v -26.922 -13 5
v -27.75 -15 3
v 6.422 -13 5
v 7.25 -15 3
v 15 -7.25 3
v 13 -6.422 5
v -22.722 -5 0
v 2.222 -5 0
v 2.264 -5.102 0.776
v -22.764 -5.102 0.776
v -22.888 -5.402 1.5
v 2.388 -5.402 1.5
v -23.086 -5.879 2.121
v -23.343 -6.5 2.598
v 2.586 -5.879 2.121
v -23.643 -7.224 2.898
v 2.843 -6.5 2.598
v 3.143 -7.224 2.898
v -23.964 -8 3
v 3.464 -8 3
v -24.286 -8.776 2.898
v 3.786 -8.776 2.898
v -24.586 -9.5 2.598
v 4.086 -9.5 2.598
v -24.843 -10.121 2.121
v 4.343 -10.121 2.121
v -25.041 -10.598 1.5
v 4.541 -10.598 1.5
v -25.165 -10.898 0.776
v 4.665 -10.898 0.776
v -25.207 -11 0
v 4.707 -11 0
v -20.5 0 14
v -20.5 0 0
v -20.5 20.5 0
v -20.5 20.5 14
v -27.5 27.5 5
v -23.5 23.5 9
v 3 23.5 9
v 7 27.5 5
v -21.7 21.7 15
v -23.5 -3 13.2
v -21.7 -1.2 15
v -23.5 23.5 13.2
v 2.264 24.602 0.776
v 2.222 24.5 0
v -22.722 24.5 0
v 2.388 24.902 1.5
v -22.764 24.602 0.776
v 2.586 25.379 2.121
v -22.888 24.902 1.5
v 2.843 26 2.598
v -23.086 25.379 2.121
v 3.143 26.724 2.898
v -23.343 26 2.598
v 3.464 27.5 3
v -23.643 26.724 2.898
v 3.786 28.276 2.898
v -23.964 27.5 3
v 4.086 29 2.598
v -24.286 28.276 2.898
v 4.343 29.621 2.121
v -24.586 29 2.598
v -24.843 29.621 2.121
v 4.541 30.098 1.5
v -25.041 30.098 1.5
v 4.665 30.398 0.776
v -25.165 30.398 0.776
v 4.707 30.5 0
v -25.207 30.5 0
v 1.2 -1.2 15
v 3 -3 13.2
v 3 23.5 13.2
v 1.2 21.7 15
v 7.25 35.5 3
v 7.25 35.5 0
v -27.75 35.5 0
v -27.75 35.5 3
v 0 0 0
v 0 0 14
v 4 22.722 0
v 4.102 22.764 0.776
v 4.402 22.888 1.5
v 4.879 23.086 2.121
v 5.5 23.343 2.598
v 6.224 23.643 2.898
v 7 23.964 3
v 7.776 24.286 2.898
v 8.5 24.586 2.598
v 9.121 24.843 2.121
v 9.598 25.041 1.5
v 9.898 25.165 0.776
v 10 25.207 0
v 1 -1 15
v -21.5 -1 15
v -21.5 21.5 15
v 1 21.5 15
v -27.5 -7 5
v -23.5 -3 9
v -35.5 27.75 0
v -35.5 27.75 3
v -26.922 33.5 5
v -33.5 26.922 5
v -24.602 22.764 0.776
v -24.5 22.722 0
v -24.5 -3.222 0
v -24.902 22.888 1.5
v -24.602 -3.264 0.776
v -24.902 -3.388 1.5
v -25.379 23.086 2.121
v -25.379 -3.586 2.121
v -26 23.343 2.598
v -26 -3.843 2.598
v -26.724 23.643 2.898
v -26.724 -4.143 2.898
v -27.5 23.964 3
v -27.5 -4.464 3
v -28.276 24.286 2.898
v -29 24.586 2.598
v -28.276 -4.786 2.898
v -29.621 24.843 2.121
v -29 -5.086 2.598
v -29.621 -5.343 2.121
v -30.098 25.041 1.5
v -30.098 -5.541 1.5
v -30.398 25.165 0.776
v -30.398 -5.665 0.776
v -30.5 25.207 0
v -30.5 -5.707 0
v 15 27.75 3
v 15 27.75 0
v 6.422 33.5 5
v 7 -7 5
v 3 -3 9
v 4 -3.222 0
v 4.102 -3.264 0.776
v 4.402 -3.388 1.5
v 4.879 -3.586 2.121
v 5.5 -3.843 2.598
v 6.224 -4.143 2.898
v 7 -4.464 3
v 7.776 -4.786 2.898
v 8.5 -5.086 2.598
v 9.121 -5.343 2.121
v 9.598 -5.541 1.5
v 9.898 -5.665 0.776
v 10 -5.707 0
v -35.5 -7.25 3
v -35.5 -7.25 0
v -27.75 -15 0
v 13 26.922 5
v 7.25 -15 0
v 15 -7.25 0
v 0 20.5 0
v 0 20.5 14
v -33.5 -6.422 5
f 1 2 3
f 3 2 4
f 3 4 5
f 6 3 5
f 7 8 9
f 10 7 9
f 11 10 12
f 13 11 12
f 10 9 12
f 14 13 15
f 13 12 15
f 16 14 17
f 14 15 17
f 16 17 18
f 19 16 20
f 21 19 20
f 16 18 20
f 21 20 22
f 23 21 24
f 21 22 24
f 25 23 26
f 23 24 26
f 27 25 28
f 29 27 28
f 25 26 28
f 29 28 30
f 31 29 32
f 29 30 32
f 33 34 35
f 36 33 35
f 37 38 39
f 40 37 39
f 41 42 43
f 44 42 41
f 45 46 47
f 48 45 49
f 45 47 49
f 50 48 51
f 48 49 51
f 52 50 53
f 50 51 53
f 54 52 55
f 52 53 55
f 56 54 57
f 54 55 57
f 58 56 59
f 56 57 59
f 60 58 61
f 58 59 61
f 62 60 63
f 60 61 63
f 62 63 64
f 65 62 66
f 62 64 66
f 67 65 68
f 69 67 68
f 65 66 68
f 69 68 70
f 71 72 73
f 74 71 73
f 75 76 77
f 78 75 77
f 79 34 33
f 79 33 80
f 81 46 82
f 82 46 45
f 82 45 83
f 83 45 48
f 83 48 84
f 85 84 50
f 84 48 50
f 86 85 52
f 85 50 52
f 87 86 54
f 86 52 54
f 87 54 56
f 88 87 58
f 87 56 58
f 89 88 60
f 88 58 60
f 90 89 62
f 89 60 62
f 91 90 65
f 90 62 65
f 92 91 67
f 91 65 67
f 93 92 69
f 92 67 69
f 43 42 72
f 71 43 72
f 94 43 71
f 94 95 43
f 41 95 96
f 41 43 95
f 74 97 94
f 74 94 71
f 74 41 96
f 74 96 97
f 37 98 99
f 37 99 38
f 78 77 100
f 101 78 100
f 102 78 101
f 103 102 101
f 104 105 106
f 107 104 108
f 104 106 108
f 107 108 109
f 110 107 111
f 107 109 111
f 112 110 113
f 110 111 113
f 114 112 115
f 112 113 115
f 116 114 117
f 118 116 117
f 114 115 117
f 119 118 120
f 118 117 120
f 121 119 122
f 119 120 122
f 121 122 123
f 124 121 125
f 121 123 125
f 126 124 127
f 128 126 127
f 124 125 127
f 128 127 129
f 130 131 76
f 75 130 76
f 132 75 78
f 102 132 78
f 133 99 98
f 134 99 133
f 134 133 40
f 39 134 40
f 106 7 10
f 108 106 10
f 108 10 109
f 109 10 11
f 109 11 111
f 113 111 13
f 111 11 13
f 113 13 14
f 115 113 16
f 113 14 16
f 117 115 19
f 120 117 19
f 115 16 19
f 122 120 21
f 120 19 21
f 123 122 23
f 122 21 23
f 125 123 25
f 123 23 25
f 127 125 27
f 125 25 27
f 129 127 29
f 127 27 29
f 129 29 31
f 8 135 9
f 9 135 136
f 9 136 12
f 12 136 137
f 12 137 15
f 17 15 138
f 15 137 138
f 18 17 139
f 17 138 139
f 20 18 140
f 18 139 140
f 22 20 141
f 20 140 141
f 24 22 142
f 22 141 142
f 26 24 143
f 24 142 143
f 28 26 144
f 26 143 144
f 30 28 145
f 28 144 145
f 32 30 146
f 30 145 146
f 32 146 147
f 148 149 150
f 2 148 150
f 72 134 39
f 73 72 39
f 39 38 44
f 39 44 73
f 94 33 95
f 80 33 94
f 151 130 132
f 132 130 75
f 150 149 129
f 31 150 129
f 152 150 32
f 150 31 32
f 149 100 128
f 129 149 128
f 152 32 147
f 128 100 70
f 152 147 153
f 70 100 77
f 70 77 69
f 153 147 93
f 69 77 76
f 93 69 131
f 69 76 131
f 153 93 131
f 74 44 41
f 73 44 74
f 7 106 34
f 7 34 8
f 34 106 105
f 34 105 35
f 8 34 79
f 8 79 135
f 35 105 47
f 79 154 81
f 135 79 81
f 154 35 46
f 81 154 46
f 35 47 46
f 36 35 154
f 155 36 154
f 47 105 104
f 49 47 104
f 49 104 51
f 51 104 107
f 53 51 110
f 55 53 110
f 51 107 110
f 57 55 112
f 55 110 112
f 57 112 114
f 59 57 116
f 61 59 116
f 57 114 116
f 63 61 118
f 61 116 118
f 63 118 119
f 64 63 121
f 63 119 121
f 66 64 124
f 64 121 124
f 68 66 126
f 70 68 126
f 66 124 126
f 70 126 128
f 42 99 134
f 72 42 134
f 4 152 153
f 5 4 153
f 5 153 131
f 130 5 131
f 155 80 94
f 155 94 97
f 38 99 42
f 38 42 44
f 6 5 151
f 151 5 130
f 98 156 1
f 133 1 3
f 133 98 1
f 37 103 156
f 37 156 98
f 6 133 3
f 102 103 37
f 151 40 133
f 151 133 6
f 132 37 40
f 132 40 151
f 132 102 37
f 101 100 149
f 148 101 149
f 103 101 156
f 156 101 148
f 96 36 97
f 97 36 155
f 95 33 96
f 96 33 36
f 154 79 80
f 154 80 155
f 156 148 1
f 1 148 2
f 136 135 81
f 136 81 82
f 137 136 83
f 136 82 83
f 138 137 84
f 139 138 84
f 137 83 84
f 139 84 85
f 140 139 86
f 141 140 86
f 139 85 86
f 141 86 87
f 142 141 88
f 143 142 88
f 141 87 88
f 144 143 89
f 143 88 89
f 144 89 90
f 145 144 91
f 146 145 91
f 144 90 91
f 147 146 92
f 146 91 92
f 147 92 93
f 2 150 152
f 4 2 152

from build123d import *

# Parameters (mm, degrees)
SKETCH_W        = 20.5
SKETCH_H        = 20.5
PAD_DEPTH       = 5
SKETCH001_W     = 26.5
SKETCH001_H     = 26.5
SKETCH001_W_2   = 20.5
SKETCH001_H_2   = 20.5
PAD001_DEPTH    = 10
CHAMFER_SIZE    = 4
CHAMFER001_SIZE = 1
CHAMFER002_SIZE = 1.8
CHAMFER003_SIZE = 2
SKETCH003_R     = 3


with BuildPart() as part:
    # Sketch → Pad (new body)
    with BuildSketch(Plane.XY):
        Polygon((7.25, -15), (15, -7.25), (15, 27.75), (7.25, 35.5), (-27.75, 35.5), (-35.5, 27.75), (-35.5, -7.25), (-27.75, -15), align=None)
        with Locations((-10.25, 10.25)):
            Rectangle(SKETCH_W, SKETCH_H, mode=Mode.SUBTRACT)
    extrude(amount=PAD_DEPTH)

    # Sketch001 (on Face14 of Pad) → Pad001 (join)
    with BuildSketch(Plane.XY.offset(5)):
        with Locations((-10.25, 10.25)):
            Rectangle(SKETCH001_W, SKETCH001_H)
        with Locations((-10.25, 10.25)):
            Rectangle(SKETCH001_W_2, SKETCH001_H_2, mode=Mode.SUBTRACT)
    extrude(amount=PAD001_DEPTH)

    # Chamfer
    chamfer_edges = [part.edges().sort_by_distance(p)[0] for p in [
        (-10.25, -3, 5),
        (3, 10.25, 5),
        (-10.25, 23.5, 5),
        (-23.5, 10.25, 5),
    ]]
    chamfer(chamfer_edges, length=CHAMFER_SIZE)

    # Chamfer001
    chamfer001_edges = [part.edges().sort_by_distance(p)[0] for p in [
        (0, 10.25, 15),
        (-10.25, 0, 15),
        (-20.5, 10.25, 15),
        (-10.25, 20.5, 15),
    ]]
    chamfer(chamfer001_edges, length=CHAMFER001_SIZE)

    # Chamfer002
    chamfer002_edges = [part.edges().sort_by_distance(p)[0] for p in [
        (3, 10.25, 15),
        (-10.25, 23.5, 15),
        (-23.5, 10.25, 15),
        (-10.25, -3, 15),
    ]]
    chamfer(chamfer002_edges, length=CHAMFER002_SIZE)

    # Chamfer003
    chamfer003_edges = [part.edges().sort_by_distance(p)[0] for p in [
        (15, 10.25, 5),
        (11.125, 31.625, 5),
        (-10.25, 35.5, 5),
        (-31.625, 31.625, 5),
        (-35.5, 10.25, 5),
        (-31.625, -11.125, 5),
        (-10.25, -15, 5),
        (11.125, -11.125, 5),
    ]]
    chamfer(chamfer003_edges, length=CHAMFER003_SIZE)

    # SubtractivePipe: sweep along a path in Sketch002
    with BuildLine(Plane(origin=(0, 0, 0), x_dir=(1, 0, 0), z_dir=(0, 0, -1))) as subtractivepipe_path:
        Line((-27.5, -23.964466), (-27.5, 4.464466))
        Line((-27.5, 4.464466), (-23.964466, 8))
        Line((-23.964466, 8), (3.464466, 8))
        Line((3.464466, 8), (7, 4.464466))
        Line((7, 4.464466), (7, -23.964466))
        Line((7, -23.964466), (3.464466, -27.5))
        Line((3.464466, -27.5), (-23.964466, -27.5))
        Line((-23.964466, -27.5), (-27.5, -23.964466))
    # Sketch003 → SubtractivePipe (sweep, cut)
    with BuildSketch(Plane.XZ):
        with Locations((-27.5, 0)):
            Circle(SKETCH003_R)
    sweep(path=subtractivepipe_path.line, transition=Transition.RIGHT, mode=Mode.SUBTRACT)


solid = part.part
